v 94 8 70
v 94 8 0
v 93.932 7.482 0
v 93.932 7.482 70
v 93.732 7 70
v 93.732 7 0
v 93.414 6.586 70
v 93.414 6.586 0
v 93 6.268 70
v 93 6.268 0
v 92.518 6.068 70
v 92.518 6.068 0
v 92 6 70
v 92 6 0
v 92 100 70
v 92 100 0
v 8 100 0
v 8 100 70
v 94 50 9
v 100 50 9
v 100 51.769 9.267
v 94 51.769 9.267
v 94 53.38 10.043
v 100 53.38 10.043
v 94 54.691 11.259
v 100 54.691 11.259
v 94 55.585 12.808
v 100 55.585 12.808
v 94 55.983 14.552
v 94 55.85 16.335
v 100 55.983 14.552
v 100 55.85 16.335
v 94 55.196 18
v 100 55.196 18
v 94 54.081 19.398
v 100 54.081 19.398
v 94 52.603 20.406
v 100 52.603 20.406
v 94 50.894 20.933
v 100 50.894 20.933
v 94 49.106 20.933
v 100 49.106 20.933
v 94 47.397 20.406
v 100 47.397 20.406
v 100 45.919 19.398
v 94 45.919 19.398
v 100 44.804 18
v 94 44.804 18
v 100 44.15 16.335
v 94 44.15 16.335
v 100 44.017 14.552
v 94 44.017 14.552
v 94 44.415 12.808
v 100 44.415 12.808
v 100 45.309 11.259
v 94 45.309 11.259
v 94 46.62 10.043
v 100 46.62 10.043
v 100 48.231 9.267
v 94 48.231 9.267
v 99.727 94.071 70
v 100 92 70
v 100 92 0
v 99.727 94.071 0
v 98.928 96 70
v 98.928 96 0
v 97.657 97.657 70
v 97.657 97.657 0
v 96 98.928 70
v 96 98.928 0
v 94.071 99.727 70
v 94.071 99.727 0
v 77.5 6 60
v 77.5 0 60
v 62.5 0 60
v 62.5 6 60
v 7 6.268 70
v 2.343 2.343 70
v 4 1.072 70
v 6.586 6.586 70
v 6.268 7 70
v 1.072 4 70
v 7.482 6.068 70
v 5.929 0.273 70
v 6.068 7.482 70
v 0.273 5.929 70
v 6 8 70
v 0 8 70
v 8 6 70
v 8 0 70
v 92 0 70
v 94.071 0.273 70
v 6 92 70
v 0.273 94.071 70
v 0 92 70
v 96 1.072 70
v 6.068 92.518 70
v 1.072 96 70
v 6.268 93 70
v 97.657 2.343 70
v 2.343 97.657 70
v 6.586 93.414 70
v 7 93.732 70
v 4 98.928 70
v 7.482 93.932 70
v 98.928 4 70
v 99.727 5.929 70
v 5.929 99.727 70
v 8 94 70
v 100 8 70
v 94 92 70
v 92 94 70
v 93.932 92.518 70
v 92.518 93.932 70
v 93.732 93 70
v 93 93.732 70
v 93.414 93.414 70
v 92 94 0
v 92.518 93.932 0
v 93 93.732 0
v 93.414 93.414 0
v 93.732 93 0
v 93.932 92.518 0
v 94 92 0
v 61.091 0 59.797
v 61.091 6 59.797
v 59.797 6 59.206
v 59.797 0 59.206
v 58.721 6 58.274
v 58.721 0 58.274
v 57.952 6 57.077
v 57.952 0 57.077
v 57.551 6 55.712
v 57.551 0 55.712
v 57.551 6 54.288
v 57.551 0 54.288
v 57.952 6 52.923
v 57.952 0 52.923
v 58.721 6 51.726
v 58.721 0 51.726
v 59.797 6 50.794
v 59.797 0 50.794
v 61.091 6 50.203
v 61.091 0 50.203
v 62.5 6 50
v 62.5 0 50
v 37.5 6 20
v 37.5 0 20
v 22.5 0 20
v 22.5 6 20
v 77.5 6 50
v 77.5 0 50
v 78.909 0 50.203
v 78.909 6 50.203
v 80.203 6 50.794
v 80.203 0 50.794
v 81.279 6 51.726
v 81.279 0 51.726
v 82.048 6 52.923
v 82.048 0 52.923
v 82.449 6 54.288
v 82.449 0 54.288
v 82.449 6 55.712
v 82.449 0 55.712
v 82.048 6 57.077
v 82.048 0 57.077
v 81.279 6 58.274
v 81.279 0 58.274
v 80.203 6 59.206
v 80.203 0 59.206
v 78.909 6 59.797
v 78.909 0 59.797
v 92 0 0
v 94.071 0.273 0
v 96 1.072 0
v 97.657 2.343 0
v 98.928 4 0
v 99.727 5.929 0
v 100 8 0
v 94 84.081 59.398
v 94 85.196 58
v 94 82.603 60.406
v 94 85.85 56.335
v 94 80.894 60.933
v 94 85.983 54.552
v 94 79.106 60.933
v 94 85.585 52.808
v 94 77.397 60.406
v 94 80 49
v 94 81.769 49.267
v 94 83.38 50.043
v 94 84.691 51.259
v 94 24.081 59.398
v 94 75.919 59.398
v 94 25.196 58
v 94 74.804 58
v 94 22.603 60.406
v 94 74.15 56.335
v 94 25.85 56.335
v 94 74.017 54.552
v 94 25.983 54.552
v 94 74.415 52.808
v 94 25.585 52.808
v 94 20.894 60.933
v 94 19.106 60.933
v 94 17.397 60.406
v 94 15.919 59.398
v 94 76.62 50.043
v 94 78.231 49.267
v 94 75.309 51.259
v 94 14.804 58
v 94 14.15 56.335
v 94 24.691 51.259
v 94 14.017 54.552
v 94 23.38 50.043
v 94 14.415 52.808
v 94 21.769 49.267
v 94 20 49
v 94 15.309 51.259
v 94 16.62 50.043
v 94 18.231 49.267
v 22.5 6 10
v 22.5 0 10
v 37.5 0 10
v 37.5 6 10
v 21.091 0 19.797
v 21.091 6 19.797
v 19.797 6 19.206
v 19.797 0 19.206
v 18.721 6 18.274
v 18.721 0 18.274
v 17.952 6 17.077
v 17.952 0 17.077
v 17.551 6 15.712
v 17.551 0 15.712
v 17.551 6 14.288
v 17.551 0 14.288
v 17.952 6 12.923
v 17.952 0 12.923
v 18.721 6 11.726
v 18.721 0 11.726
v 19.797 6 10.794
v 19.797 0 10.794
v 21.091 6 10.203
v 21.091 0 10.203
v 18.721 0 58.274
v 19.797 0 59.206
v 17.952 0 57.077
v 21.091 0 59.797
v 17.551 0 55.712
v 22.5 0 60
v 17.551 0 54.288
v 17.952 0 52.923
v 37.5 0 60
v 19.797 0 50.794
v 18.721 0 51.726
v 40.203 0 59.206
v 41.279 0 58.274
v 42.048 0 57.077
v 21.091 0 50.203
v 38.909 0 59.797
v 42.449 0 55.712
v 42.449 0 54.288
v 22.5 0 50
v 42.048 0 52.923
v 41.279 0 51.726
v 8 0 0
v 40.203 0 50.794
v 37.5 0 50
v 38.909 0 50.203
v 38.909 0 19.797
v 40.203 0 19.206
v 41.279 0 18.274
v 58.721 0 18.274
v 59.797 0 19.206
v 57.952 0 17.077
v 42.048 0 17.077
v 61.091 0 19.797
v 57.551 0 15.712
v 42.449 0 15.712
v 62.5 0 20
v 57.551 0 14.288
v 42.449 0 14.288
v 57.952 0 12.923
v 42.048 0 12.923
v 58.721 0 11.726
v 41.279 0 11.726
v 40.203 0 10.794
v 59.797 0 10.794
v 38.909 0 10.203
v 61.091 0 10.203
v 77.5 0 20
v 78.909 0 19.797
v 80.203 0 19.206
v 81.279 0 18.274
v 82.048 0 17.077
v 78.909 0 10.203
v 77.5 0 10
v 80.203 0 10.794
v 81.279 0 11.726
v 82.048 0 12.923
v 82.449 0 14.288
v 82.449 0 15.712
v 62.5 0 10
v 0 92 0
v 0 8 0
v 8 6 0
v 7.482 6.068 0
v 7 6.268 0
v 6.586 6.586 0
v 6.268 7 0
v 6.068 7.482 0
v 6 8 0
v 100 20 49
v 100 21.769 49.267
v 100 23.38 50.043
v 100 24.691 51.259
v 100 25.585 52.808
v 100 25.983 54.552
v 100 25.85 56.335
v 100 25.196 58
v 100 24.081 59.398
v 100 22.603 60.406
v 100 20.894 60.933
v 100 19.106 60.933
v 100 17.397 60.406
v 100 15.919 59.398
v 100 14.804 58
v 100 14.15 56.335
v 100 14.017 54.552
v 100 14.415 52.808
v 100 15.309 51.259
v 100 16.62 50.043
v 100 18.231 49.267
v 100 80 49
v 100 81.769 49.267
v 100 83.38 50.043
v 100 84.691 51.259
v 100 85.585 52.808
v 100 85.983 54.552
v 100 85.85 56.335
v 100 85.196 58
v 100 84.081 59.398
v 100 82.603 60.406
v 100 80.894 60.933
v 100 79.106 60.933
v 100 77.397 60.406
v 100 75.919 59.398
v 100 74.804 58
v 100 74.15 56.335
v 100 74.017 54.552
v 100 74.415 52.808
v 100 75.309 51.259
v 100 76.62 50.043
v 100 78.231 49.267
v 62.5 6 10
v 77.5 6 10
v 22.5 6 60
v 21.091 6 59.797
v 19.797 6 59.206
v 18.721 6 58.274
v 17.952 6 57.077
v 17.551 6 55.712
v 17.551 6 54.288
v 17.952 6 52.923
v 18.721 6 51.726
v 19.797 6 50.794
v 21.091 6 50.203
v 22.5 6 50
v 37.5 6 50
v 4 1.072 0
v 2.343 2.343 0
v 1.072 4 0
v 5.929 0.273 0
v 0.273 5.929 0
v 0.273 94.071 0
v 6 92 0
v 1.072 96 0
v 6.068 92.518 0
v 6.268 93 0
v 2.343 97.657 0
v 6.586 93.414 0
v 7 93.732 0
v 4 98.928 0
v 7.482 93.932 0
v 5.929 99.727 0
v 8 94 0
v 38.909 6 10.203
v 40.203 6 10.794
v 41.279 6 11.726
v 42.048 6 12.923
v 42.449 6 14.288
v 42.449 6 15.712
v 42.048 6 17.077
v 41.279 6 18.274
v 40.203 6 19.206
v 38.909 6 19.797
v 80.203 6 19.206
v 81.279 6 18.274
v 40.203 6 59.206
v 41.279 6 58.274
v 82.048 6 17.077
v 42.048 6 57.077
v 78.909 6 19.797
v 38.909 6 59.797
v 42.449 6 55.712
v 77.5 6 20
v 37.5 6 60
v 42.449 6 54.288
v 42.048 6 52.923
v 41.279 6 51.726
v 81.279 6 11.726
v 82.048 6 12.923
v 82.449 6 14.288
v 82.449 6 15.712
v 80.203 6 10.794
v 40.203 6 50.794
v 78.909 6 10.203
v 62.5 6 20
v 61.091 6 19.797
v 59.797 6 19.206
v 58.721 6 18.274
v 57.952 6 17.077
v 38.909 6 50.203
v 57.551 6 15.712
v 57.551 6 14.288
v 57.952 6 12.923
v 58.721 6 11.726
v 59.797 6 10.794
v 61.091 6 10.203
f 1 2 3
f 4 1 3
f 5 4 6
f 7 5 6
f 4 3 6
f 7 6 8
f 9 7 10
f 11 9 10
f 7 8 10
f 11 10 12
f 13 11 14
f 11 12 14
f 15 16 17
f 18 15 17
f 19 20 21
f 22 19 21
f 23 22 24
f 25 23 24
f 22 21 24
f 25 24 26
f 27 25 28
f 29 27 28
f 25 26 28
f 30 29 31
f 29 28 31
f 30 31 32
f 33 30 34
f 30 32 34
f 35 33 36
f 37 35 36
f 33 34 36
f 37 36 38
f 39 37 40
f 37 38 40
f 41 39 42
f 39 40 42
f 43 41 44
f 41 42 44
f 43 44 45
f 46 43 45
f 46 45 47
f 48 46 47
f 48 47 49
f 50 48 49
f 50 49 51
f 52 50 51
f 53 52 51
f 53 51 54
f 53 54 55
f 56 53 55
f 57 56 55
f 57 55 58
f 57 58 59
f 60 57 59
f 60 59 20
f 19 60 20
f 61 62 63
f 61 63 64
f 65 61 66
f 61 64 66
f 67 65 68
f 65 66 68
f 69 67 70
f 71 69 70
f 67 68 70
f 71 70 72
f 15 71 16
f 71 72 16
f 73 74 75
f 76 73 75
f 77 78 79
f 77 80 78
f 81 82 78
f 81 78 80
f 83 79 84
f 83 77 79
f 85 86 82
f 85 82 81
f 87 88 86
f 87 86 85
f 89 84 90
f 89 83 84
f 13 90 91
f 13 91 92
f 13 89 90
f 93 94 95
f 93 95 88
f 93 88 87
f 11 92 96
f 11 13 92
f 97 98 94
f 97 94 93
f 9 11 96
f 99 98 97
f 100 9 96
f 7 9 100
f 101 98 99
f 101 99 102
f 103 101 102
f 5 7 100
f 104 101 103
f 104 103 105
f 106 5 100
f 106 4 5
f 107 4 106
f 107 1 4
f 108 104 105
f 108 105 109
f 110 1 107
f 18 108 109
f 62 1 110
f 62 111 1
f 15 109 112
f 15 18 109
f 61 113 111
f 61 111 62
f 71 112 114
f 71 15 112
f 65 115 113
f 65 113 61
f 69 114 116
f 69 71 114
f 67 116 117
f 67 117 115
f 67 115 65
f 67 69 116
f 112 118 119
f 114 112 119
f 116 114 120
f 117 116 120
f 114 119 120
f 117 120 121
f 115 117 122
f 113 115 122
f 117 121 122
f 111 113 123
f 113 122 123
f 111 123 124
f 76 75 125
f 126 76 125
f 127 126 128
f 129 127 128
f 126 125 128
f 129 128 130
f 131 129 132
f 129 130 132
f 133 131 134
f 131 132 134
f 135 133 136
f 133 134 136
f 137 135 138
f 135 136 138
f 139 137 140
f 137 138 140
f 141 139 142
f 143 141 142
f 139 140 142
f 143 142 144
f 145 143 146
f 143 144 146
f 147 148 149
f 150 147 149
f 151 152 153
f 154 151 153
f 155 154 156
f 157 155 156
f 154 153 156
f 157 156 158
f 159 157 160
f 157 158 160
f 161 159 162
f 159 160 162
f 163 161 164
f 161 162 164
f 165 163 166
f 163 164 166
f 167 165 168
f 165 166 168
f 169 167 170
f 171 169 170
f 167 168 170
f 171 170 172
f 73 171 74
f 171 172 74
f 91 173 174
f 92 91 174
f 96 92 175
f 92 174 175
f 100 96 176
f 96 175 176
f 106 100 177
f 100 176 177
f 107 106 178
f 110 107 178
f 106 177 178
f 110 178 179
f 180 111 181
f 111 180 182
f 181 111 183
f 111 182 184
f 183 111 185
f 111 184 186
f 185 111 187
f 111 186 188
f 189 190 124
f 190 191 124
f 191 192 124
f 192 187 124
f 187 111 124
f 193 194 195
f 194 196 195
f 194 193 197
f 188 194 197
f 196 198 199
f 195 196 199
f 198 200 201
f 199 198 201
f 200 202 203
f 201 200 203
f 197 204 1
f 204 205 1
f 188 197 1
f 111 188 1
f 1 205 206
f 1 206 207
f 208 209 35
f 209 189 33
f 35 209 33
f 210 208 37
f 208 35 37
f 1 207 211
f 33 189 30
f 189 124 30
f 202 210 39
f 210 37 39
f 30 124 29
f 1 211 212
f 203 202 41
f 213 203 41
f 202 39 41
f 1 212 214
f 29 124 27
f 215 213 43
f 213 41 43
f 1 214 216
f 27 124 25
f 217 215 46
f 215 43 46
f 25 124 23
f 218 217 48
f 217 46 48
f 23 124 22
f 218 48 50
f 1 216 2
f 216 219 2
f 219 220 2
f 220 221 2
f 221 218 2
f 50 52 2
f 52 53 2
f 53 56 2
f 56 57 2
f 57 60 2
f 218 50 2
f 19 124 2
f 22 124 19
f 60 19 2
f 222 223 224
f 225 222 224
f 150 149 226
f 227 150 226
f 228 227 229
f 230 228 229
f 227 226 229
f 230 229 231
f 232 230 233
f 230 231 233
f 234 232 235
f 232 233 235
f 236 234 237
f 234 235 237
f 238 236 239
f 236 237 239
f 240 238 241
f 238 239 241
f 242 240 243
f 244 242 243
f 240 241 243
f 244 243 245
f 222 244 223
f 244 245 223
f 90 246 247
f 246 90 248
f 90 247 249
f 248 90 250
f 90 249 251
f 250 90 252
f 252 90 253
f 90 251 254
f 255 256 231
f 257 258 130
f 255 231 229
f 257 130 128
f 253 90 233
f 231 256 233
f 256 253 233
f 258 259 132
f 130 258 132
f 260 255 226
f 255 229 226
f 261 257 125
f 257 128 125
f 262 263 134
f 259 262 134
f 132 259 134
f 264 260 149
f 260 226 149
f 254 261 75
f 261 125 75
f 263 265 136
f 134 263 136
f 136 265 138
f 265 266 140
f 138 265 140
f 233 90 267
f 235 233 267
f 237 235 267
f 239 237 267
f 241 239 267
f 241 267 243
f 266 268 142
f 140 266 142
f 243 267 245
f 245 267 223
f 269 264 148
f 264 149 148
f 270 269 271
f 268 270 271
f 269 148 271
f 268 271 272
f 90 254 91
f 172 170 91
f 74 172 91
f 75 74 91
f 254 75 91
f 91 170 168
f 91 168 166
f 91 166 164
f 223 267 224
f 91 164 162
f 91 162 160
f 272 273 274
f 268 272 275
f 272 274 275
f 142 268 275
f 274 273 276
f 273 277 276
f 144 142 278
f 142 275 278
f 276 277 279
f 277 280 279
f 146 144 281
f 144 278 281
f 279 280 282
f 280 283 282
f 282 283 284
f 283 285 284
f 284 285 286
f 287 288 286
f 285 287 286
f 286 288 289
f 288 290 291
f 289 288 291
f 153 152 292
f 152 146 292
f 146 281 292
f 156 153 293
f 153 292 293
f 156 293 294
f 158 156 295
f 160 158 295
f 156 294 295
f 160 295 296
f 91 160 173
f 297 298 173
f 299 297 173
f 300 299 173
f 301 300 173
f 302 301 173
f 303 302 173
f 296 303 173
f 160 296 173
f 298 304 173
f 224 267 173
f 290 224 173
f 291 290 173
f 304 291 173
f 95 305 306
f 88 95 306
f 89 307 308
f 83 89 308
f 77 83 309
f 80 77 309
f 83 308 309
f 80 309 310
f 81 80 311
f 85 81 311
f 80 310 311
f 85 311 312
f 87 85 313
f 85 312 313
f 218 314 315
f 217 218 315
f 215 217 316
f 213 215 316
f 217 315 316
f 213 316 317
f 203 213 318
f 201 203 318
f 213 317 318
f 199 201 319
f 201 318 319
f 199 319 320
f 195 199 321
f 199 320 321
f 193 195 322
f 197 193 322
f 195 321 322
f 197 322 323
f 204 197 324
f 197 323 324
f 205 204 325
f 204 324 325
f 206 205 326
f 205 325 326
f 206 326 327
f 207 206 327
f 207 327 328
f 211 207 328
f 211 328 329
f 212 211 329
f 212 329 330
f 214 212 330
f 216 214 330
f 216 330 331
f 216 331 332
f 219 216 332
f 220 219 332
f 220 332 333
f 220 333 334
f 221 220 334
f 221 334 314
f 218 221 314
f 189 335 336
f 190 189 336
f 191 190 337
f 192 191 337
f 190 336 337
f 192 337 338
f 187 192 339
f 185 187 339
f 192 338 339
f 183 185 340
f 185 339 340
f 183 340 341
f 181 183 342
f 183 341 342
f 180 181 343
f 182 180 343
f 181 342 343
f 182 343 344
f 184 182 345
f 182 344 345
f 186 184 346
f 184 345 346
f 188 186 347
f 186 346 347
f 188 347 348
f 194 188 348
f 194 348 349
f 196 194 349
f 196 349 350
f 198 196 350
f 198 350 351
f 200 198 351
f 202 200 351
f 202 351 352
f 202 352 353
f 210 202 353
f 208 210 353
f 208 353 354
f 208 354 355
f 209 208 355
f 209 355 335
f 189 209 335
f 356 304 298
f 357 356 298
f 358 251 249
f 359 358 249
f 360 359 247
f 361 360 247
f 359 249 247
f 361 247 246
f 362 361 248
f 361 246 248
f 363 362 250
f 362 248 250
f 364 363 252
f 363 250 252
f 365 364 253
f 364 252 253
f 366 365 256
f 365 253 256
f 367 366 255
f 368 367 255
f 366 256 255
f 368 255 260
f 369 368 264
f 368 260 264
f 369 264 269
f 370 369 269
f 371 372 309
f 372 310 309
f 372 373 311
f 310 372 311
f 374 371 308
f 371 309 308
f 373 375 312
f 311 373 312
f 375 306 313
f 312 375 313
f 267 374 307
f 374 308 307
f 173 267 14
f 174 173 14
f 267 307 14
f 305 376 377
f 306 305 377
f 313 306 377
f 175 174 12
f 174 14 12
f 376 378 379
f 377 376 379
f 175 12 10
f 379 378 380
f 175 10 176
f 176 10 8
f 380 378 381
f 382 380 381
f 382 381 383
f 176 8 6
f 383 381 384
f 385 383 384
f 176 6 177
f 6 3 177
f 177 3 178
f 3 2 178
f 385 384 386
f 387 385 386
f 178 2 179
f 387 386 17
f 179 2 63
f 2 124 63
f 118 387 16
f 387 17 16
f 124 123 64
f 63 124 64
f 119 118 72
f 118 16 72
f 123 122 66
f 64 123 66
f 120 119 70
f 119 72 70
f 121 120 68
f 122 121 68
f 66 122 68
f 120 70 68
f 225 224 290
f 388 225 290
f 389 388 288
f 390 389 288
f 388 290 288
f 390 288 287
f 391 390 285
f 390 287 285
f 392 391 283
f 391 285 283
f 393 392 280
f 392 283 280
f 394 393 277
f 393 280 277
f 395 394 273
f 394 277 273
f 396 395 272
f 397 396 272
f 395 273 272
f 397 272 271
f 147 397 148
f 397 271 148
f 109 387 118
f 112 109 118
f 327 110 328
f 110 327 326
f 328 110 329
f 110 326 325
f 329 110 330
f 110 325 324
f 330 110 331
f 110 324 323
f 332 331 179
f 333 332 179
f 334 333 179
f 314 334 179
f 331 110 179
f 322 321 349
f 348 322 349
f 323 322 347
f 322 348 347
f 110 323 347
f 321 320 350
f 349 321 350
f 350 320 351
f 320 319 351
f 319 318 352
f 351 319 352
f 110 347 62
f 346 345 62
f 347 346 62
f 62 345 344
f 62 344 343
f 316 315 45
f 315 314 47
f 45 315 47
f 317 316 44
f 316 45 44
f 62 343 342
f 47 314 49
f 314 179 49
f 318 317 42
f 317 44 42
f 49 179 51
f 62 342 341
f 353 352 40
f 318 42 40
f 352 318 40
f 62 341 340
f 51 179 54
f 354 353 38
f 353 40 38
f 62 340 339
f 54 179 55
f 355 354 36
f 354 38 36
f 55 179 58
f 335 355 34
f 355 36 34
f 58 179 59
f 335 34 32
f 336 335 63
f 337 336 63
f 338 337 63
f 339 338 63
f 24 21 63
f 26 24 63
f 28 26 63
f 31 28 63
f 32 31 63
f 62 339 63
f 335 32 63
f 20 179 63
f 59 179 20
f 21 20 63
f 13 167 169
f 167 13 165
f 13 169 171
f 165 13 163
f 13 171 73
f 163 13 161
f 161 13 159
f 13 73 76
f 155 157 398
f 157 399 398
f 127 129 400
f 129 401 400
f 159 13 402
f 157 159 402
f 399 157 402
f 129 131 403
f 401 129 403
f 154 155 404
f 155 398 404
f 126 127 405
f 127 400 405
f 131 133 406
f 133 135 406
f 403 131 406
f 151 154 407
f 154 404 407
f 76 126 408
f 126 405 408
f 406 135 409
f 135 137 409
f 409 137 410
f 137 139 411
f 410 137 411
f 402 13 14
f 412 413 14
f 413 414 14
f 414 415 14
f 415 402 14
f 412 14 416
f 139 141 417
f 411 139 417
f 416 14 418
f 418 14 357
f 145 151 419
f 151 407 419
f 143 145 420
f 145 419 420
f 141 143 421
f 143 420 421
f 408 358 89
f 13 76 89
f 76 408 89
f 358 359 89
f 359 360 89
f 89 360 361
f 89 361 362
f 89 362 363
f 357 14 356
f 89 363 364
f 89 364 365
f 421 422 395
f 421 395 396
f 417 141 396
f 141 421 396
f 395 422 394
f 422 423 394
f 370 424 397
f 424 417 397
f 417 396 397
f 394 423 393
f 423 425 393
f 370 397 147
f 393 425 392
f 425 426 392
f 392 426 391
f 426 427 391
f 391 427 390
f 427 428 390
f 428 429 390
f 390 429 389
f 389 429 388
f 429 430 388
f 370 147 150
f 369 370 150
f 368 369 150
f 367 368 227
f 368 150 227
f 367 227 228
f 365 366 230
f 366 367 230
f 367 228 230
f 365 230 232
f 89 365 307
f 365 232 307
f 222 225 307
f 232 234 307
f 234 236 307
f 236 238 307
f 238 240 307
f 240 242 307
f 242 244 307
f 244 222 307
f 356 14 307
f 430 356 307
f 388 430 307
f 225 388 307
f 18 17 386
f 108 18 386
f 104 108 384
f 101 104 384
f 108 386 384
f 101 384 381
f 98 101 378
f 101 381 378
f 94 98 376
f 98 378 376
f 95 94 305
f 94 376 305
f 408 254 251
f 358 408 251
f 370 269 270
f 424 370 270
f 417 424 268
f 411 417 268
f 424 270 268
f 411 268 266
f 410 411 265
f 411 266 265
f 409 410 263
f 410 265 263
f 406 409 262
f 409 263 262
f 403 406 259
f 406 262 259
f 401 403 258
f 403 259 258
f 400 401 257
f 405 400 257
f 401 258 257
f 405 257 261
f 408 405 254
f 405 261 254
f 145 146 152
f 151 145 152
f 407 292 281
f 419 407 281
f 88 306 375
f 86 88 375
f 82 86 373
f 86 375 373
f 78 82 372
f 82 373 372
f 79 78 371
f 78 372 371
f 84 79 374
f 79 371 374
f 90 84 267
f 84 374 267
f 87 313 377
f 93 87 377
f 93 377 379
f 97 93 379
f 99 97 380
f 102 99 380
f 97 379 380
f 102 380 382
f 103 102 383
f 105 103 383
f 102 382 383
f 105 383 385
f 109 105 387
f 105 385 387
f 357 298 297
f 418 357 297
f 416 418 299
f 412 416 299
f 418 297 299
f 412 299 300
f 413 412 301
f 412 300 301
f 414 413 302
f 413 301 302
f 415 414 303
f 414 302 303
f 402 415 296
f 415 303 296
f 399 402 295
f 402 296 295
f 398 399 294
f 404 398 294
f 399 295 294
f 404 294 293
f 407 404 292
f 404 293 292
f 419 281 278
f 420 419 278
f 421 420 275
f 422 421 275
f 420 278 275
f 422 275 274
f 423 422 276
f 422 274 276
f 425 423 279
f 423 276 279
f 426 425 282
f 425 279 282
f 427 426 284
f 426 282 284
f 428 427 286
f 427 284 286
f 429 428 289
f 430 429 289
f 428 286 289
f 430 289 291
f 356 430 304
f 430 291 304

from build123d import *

# Parameters (mm, degrees)
EXTRUDE_1_DEPTH             = 70
CUT_EXTRUDE_1_REACH         = 102
SKETCH_2_R                  = 6
CUT_EXTRUDE_2_DEPTH         = 6
PATTERN_LINEAR_1_COUNT      = 2
PATTERN_LINEAR_1_PITCH      = 40
PATTERN_LINEAR_1_COUNT_DIR2 = 2
PATTERN_LINEAR_1_PITCH_DIR2 = 40


with BuildPart() as part:
    # 草图1 → 凸台-拉伸1 (new body)
    with BuildSketch(Plane.XY):
        with BuildLine():
            Line((8, 0), (92, 0))
            ThreePointArc((92, 0), (97.656854249, 2.343145751), (100, 8))
            Line((100, 8), (100, 92))
            ThreePointArc((100, 92), (97.656854249, 97.656854249), (92, 100))
            Line((92, 100), (8, 100))
            ThreePointArc((8, 100), (2.343145751, 97.656854249), (0, 92))
            Line((0, 92), (0, 8))
            ThreePointArc((0, 8), (2.343145751, 2.343145751), (8, 0))
        make_face()
        with BuildLine():
            Line((8, 94), (92, 94))
            ThreePointArc((92, 94), (93.414213562, 93.414213562), (94, 92))
            Line((94, 92), (94, 8))
            ThreePointArc((94, 8), (93.414213562, 6.585786438), (92, 6))
            Line((92, 6), (8, 6))
            ThreePointArc((8, 6), (6.585786438, 6.585786438), (6, 8))
            Line((6, 8), (6, 92))
            ThreePointArc((6, 92), (6.585786438, 93.414213562), (8, 94))
        make_face(mode=Mode.SUBTRACT)
    extrude(amount=EXTRUDE_1_DEPTH)

    # 草图2 → 切除-拉伸1 (cut, up to next)
    with BuildSketch(Plane(origin=(100, 0, 0), x_dir=(0, 0, -1), z_dir=(1, 0, 0)), mode=Mode.PRIVATE) as cut_extrude_1_sk1:
        with Locations((-55, 80)):
            Circle(SKETCH_2_R)
    cut_extrude_1_tool1 = extrude(cut_extrude_1_sk1.sketch, amount=-CUT_EXTRUDE_1_REACH, mode=Mode.PRIVATE) & part.part
    add(cut_extrude_1_tool1.solids().sort_by_distance((100, 80, 55))[0], mode=Mode.SUBTRACT)
    # 草图2 → 切除-拉伸1 (cut, up to next)
    with BuildSketch(Plane(origin=(100, 0, 0), x_dir=(0, 0, -1), z_dir=(1, 0, 0)), mode=Mode.PRIVATE) as cut_extrude_1_sk2:
        with Locations((-55, 20)):
            Circle(SKETCH_2_R)
    cut_extrude_1_tool2 = extrude(cut_extrude_1_sk2.sketch, amount=-CUT_EXTRUDE_1_REACH, mode=Mode.PRIVATE) & part.part
    add(cut_extrude_1_tool2.solids().sort_by_distance((100, 20, 55))[0], mode=Mode.SUBTRACT)
    # 草图2 → 切除-拉伸1 (cut, up to next)
    with BuildSketch(Plane(origin=(100, 0, 0), x_dir=(0, 0, -1), z_dir=(1, 0, 0)), mode=Mode.PRIVATE) as cut_extrude_1_sk3:
        with Locations((-15, 50)):
            Circle(SKETCH_2_R)
    cut_extrude_1_tool3 = extrude(cut_extrude_1_sk3.sketch, amount=-CUT_EXTRUDE_1_REACH, mode=Mode.PRIVATE) & part.part
    add(cut_extrude_1_tool3.solids().sort_by_distance((100, 50, 15))[0], mode=Mode.SUBTRACT)

    # 草图3 → 切除-拉伸2 (cut)
    with BuildSketch(Plane.XZ):
        with BuildLine():
            Line((77.5, 60), (62.5, 60))
            ThreePointArc((62.5, 60), (57.5, 55), (62.5, 50))
            Line((62.5, 50), (77.5, 50))
            ThreePointArc((77.5, 50), (82.5, 55), (77.5, 60))
        make_face()
    cut_extrude_2 = extrude(amount=-CUT_EXTRUDE_2_DEPTH, mode=Mode.SUBTRACT)

    # 阵列(线性)1: Cut-Extrude 2 2 × 2
    with Locations(*[(-j * PATTERN_LINEAR_1_PITCH_DIR2, 0, -i * PATTERN_LINEAR_1_PITCH) for i in range(PATTERN_LINEAR_1_COUNT) for j in range(PATTERN_LINEAR_1_COUNT_DIR2) if (i, j) != (0, 0)]):
        add(cut_extrude_2, mode=Mode.SUBTRACT)


solid = part.part
